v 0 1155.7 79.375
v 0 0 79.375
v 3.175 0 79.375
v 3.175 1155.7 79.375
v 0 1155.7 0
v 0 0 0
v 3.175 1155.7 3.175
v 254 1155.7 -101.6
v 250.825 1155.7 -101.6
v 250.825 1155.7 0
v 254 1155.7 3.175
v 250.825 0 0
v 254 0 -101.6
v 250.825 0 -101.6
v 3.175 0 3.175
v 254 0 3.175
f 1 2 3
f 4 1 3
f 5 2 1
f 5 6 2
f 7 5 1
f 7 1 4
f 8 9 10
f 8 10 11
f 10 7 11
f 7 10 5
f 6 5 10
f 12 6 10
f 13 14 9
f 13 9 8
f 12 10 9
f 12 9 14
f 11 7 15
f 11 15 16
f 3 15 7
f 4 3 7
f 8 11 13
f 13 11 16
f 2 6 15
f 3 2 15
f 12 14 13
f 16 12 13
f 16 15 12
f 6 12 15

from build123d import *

# Parameters (mm, degrees)
F0_W     = 254
F0_H     = 1155.7
F1_DEPTH = 3.175
F2_W     = 3.175
F2_H     = 1155.7
F3_DEPTH = 76.2
F4_W     = 3.175
F4_H     = 1155.7
F5_DEPTH = 101.6


with BuildPart() as f1:
    # F0 (on Top) → F1 (new body)
    with BuildSketch(Plane.XY):
        with Locations((127, 577.85)):
            Rectangle(F0_W, F0_H)
    extrude(amount=F1_DEPTH)

    # F2 (on face) → F3 (join)
    with BuildSketch(Plane.XY.offset(3.175)):
        with Locations((1.5875, 577.85)):
            Rectangle(F2_W, F2_H)
    extrude(amount=F3_DEPTH)

    # F4 (on face) → F5 (join)
    with BuildSketch(Plane(origin=(0, 0, 0), x_dir=(1, 0, 0), z_dir=(0, 0, -1))):
        with Locations((252.4125, -577.85)):
            Rectangle(F4_W, F4_H)
    extrude(amount=F5_DEPTH)


solid = f1.part
